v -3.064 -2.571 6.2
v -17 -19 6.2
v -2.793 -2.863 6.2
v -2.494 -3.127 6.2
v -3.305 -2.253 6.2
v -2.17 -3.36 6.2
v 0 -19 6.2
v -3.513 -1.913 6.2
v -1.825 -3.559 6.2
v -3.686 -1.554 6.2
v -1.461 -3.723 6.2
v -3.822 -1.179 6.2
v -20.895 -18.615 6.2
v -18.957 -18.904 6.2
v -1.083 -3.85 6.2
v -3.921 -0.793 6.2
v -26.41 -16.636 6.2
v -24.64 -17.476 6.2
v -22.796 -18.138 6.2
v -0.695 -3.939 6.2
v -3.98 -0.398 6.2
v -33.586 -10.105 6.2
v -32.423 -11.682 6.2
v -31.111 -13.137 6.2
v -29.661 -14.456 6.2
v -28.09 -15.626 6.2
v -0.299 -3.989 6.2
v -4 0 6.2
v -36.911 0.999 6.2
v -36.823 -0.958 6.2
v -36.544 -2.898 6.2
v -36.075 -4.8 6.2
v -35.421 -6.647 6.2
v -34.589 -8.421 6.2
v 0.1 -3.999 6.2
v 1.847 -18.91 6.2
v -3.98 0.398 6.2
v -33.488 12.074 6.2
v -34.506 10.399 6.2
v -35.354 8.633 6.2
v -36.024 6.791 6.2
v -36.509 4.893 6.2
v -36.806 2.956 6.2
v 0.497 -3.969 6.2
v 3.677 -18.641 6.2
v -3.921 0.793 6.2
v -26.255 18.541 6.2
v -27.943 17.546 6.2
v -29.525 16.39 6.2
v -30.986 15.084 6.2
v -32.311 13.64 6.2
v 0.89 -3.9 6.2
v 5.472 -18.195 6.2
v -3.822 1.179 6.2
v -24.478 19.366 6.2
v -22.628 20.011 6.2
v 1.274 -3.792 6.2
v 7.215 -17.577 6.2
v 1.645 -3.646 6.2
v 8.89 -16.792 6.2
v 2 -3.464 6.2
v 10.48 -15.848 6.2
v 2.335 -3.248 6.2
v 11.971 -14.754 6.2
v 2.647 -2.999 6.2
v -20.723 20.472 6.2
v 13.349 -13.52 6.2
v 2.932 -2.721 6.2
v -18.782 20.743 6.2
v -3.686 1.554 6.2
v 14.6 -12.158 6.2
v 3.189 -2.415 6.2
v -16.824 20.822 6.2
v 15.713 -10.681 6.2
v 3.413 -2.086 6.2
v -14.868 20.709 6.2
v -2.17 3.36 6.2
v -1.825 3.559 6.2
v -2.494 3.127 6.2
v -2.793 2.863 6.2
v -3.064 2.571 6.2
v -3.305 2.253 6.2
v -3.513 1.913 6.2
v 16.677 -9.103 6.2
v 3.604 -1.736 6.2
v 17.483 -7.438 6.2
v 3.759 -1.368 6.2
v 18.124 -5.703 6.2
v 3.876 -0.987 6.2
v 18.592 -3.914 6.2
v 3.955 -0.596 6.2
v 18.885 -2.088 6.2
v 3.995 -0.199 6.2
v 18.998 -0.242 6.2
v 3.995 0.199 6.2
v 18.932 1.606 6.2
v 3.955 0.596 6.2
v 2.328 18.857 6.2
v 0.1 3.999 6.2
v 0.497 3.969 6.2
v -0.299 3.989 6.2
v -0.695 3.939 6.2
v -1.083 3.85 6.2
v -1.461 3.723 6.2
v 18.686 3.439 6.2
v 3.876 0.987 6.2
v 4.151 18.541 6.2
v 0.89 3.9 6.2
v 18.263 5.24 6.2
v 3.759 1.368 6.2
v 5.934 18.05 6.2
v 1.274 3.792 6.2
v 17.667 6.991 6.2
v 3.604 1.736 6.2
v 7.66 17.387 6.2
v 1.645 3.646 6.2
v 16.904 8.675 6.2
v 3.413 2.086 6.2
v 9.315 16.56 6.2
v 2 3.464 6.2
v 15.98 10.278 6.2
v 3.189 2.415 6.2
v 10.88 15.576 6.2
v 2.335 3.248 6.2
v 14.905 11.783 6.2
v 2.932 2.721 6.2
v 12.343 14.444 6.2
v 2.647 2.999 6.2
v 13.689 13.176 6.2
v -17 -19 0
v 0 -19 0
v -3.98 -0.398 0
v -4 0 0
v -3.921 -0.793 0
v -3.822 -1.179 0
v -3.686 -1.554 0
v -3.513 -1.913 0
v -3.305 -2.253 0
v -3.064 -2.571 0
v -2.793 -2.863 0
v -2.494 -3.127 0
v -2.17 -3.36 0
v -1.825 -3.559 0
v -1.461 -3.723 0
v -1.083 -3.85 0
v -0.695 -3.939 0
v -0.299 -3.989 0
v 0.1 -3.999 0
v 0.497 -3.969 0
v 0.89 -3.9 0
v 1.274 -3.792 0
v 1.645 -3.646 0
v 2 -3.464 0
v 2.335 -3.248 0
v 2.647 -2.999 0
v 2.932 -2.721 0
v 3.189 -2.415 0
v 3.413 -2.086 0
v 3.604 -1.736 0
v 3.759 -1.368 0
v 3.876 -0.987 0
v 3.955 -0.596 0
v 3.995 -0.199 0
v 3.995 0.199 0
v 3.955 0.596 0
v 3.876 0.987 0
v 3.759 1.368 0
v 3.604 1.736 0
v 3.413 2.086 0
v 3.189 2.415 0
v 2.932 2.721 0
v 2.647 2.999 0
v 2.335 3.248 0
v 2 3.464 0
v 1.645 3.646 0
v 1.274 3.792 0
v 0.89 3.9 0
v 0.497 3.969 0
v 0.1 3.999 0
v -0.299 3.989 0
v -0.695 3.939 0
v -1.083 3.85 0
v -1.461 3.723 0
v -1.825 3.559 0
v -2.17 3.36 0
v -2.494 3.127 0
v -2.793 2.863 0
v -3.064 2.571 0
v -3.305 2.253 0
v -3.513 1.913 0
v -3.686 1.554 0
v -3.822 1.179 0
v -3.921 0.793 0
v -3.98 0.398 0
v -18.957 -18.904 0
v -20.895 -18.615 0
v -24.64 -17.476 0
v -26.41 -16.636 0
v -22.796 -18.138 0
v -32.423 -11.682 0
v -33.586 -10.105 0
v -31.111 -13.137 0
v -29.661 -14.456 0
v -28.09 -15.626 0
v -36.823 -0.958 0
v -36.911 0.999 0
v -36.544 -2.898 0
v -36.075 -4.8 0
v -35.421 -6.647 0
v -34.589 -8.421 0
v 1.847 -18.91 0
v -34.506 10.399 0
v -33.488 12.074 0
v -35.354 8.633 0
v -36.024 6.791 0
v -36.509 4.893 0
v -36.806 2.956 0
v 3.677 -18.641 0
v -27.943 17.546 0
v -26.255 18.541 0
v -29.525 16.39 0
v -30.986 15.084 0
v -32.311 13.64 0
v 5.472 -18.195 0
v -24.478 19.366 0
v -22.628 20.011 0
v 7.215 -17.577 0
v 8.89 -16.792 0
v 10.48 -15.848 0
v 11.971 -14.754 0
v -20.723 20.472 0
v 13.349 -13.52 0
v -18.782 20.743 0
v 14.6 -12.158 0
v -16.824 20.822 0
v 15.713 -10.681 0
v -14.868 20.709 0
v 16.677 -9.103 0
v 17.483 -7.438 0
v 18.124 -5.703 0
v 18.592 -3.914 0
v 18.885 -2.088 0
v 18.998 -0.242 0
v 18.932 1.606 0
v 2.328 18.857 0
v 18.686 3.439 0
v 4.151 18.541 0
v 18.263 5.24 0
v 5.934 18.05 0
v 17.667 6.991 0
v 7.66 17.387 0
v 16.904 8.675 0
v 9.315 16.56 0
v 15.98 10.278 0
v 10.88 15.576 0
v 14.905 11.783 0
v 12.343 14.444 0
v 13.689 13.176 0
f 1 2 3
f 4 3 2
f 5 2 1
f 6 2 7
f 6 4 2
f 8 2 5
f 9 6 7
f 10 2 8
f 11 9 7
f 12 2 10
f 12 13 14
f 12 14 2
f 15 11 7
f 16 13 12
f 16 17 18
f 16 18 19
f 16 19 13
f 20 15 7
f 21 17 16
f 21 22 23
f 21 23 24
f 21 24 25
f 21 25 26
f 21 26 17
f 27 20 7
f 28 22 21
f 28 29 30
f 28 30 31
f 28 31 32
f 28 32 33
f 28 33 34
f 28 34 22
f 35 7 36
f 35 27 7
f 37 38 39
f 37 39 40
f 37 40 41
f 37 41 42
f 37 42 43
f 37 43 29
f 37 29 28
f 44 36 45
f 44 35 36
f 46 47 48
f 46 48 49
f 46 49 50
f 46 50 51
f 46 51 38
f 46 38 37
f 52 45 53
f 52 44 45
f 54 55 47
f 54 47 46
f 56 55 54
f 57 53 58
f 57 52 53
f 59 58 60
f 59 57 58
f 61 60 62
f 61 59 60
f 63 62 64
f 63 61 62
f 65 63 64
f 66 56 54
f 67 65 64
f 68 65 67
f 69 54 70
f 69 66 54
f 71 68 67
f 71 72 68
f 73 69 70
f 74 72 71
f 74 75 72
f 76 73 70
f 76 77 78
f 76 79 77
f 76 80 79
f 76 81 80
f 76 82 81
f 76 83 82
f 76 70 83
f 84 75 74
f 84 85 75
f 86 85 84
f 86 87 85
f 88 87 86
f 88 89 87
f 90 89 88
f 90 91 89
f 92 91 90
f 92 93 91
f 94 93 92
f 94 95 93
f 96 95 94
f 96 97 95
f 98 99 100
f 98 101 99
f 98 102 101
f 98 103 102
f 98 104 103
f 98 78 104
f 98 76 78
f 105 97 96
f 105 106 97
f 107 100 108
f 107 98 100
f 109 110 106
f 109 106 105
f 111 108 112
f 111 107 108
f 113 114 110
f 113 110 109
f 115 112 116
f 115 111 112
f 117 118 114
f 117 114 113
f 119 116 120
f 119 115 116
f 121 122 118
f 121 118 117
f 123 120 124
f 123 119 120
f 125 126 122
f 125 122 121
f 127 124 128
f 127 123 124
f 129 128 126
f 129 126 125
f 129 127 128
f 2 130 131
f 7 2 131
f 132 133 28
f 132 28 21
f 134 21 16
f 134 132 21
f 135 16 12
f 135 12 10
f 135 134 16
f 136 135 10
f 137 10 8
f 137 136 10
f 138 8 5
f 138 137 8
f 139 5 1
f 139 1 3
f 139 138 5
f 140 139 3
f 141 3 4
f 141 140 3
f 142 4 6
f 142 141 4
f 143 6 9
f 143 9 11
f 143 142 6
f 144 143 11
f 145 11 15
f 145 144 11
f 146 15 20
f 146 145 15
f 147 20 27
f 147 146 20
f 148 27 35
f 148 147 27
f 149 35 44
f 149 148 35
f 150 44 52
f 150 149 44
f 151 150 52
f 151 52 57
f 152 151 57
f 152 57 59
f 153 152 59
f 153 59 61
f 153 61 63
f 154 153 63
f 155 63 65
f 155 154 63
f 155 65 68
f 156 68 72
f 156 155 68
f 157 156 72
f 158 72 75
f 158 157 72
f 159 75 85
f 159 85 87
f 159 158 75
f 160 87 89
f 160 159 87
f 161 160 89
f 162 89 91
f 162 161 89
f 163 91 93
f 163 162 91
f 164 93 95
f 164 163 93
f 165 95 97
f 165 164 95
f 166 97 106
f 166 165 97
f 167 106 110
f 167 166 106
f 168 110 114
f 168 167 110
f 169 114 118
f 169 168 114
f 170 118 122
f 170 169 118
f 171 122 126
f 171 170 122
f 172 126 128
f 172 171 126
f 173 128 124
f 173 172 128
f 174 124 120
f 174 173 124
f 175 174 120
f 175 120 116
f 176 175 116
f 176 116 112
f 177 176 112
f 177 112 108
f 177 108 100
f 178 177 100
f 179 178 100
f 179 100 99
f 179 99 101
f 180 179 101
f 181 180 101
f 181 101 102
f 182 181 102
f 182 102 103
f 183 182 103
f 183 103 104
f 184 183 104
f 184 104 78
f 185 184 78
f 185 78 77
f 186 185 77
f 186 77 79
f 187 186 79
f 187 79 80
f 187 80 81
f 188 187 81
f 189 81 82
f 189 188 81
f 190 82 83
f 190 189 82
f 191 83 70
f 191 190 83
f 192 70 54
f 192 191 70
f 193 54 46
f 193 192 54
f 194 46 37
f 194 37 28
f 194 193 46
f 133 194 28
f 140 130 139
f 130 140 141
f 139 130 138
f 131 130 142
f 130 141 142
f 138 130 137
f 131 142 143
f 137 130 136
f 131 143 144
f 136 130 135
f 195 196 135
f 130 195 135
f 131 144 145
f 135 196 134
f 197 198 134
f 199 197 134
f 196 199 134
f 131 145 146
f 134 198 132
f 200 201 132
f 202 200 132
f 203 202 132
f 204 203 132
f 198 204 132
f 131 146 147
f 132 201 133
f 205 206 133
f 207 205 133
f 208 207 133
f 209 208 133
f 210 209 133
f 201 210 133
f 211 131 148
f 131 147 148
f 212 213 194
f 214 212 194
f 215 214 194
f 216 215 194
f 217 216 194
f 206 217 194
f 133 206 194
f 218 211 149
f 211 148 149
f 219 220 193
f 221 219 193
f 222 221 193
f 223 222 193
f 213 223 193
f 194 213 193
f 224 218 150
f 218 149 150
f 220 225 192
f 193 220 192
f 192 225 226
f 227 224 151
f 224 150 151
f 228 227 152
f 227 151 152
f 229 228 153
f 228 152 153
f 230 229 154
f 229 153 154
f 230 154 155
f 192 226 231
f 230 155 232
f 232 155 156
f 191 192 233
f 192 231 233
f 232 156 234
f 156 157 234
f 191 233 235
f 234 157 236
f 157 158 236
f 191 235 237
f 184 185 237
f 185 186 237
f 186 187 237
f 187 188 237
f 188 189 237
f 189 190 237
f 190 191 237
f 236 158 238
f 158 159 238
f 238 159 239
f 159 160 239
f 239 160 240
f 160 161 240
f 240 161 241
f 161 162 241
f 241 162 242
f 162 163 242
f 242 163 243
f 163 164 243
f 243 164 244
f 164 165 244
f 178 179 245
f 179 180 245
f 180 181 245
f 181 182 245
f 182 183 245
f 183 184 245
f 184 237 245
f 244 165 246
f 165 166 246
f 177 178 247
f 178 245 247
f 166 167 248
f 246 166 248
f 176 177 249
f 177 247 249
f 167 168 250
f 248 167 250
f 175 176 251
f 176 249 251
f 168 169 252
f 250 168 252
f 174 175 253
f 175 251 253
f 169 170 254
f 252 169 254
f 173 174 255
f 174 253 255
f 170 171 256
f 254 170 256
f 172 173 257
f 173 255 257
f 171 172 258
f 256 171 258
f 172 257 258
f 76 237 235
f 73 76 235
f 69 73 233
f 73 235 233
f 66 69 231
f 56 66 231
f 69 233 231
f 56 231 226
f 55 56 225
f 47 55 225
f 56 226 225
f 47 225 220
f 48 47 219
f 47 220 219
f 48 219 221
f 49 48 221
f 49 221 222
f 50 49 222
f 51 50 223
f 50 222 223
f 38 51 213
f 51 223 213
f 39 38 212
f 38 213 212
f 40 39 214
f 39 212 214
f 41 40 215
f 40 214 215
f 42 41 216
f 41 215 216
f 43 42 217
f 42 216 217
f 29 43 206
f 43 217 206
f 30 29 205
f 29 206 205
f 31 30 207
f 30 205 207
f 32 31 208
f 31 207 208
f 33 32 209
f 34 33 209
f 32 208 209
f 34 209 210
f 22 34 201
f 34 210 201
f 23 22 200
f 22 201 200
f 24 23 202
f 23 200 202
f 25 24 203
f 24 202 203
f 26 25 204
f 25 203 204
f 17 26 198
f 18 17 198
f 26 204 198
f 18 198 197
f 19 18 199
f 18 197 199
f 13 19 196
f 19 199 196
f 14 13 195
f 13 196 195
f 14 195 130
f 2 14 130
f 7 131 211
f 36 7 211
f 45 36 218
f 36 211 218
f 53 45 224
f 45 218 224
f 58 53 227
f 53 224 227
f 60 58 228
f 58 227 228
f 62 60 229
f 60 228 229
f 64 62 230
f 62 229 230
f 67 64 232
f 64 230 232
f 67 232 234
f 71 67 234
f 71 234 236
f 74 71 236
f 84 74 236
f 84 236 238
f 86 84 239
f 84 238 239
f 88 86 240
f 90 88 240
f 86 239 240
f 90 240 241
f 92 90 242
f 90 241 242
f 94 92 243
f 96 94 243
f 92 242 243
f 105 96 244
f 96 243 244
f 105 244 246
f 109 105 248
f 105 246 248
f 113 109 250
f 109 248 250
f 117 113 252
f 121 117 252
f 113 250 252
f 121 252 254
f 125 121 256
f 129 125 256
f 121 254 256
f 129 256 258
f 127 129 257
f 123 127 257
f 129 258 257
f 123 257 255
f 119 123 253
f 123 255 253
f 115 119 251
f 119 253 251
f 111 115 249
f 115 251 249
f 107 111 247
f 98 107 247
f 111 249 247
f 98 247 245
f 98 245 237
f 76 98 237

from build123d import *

# Parameters (mm, degrees)
SKETCH1_R           = 4
BOSS_EXTRUDE1_DEPTH = 6.2


with BuildPart() as part:
    # Sketch1 → Boss-Extrude1 (new body)
    with BuildSketch(Plane.XY):
        with BuildLine():
            Line((-16.999999933, -19.000000057), (6.4e-08, -19))
            ThreePointArc((6.4e-08, -19), (18.964168293, -1.166327985), (2.328256926, 18.856808311))
            Line((2.328256926, 18.856808311), (-14.868267557, 20.708519018))
            ThreePointArc((-14.868267557, 20.708519018), (-36.882849209, 1.978880998), (-16.999999933, -19.000000057))
        make_face()
        with Locations(Location((0, 0, 0), (0, 0, 180))):
            Circle(SKETCH1_R, mode=Mode.SUBTRACT)
    extrude(amount=BOSS_EXTRUDE1_DEPTH)


solid = part.part
